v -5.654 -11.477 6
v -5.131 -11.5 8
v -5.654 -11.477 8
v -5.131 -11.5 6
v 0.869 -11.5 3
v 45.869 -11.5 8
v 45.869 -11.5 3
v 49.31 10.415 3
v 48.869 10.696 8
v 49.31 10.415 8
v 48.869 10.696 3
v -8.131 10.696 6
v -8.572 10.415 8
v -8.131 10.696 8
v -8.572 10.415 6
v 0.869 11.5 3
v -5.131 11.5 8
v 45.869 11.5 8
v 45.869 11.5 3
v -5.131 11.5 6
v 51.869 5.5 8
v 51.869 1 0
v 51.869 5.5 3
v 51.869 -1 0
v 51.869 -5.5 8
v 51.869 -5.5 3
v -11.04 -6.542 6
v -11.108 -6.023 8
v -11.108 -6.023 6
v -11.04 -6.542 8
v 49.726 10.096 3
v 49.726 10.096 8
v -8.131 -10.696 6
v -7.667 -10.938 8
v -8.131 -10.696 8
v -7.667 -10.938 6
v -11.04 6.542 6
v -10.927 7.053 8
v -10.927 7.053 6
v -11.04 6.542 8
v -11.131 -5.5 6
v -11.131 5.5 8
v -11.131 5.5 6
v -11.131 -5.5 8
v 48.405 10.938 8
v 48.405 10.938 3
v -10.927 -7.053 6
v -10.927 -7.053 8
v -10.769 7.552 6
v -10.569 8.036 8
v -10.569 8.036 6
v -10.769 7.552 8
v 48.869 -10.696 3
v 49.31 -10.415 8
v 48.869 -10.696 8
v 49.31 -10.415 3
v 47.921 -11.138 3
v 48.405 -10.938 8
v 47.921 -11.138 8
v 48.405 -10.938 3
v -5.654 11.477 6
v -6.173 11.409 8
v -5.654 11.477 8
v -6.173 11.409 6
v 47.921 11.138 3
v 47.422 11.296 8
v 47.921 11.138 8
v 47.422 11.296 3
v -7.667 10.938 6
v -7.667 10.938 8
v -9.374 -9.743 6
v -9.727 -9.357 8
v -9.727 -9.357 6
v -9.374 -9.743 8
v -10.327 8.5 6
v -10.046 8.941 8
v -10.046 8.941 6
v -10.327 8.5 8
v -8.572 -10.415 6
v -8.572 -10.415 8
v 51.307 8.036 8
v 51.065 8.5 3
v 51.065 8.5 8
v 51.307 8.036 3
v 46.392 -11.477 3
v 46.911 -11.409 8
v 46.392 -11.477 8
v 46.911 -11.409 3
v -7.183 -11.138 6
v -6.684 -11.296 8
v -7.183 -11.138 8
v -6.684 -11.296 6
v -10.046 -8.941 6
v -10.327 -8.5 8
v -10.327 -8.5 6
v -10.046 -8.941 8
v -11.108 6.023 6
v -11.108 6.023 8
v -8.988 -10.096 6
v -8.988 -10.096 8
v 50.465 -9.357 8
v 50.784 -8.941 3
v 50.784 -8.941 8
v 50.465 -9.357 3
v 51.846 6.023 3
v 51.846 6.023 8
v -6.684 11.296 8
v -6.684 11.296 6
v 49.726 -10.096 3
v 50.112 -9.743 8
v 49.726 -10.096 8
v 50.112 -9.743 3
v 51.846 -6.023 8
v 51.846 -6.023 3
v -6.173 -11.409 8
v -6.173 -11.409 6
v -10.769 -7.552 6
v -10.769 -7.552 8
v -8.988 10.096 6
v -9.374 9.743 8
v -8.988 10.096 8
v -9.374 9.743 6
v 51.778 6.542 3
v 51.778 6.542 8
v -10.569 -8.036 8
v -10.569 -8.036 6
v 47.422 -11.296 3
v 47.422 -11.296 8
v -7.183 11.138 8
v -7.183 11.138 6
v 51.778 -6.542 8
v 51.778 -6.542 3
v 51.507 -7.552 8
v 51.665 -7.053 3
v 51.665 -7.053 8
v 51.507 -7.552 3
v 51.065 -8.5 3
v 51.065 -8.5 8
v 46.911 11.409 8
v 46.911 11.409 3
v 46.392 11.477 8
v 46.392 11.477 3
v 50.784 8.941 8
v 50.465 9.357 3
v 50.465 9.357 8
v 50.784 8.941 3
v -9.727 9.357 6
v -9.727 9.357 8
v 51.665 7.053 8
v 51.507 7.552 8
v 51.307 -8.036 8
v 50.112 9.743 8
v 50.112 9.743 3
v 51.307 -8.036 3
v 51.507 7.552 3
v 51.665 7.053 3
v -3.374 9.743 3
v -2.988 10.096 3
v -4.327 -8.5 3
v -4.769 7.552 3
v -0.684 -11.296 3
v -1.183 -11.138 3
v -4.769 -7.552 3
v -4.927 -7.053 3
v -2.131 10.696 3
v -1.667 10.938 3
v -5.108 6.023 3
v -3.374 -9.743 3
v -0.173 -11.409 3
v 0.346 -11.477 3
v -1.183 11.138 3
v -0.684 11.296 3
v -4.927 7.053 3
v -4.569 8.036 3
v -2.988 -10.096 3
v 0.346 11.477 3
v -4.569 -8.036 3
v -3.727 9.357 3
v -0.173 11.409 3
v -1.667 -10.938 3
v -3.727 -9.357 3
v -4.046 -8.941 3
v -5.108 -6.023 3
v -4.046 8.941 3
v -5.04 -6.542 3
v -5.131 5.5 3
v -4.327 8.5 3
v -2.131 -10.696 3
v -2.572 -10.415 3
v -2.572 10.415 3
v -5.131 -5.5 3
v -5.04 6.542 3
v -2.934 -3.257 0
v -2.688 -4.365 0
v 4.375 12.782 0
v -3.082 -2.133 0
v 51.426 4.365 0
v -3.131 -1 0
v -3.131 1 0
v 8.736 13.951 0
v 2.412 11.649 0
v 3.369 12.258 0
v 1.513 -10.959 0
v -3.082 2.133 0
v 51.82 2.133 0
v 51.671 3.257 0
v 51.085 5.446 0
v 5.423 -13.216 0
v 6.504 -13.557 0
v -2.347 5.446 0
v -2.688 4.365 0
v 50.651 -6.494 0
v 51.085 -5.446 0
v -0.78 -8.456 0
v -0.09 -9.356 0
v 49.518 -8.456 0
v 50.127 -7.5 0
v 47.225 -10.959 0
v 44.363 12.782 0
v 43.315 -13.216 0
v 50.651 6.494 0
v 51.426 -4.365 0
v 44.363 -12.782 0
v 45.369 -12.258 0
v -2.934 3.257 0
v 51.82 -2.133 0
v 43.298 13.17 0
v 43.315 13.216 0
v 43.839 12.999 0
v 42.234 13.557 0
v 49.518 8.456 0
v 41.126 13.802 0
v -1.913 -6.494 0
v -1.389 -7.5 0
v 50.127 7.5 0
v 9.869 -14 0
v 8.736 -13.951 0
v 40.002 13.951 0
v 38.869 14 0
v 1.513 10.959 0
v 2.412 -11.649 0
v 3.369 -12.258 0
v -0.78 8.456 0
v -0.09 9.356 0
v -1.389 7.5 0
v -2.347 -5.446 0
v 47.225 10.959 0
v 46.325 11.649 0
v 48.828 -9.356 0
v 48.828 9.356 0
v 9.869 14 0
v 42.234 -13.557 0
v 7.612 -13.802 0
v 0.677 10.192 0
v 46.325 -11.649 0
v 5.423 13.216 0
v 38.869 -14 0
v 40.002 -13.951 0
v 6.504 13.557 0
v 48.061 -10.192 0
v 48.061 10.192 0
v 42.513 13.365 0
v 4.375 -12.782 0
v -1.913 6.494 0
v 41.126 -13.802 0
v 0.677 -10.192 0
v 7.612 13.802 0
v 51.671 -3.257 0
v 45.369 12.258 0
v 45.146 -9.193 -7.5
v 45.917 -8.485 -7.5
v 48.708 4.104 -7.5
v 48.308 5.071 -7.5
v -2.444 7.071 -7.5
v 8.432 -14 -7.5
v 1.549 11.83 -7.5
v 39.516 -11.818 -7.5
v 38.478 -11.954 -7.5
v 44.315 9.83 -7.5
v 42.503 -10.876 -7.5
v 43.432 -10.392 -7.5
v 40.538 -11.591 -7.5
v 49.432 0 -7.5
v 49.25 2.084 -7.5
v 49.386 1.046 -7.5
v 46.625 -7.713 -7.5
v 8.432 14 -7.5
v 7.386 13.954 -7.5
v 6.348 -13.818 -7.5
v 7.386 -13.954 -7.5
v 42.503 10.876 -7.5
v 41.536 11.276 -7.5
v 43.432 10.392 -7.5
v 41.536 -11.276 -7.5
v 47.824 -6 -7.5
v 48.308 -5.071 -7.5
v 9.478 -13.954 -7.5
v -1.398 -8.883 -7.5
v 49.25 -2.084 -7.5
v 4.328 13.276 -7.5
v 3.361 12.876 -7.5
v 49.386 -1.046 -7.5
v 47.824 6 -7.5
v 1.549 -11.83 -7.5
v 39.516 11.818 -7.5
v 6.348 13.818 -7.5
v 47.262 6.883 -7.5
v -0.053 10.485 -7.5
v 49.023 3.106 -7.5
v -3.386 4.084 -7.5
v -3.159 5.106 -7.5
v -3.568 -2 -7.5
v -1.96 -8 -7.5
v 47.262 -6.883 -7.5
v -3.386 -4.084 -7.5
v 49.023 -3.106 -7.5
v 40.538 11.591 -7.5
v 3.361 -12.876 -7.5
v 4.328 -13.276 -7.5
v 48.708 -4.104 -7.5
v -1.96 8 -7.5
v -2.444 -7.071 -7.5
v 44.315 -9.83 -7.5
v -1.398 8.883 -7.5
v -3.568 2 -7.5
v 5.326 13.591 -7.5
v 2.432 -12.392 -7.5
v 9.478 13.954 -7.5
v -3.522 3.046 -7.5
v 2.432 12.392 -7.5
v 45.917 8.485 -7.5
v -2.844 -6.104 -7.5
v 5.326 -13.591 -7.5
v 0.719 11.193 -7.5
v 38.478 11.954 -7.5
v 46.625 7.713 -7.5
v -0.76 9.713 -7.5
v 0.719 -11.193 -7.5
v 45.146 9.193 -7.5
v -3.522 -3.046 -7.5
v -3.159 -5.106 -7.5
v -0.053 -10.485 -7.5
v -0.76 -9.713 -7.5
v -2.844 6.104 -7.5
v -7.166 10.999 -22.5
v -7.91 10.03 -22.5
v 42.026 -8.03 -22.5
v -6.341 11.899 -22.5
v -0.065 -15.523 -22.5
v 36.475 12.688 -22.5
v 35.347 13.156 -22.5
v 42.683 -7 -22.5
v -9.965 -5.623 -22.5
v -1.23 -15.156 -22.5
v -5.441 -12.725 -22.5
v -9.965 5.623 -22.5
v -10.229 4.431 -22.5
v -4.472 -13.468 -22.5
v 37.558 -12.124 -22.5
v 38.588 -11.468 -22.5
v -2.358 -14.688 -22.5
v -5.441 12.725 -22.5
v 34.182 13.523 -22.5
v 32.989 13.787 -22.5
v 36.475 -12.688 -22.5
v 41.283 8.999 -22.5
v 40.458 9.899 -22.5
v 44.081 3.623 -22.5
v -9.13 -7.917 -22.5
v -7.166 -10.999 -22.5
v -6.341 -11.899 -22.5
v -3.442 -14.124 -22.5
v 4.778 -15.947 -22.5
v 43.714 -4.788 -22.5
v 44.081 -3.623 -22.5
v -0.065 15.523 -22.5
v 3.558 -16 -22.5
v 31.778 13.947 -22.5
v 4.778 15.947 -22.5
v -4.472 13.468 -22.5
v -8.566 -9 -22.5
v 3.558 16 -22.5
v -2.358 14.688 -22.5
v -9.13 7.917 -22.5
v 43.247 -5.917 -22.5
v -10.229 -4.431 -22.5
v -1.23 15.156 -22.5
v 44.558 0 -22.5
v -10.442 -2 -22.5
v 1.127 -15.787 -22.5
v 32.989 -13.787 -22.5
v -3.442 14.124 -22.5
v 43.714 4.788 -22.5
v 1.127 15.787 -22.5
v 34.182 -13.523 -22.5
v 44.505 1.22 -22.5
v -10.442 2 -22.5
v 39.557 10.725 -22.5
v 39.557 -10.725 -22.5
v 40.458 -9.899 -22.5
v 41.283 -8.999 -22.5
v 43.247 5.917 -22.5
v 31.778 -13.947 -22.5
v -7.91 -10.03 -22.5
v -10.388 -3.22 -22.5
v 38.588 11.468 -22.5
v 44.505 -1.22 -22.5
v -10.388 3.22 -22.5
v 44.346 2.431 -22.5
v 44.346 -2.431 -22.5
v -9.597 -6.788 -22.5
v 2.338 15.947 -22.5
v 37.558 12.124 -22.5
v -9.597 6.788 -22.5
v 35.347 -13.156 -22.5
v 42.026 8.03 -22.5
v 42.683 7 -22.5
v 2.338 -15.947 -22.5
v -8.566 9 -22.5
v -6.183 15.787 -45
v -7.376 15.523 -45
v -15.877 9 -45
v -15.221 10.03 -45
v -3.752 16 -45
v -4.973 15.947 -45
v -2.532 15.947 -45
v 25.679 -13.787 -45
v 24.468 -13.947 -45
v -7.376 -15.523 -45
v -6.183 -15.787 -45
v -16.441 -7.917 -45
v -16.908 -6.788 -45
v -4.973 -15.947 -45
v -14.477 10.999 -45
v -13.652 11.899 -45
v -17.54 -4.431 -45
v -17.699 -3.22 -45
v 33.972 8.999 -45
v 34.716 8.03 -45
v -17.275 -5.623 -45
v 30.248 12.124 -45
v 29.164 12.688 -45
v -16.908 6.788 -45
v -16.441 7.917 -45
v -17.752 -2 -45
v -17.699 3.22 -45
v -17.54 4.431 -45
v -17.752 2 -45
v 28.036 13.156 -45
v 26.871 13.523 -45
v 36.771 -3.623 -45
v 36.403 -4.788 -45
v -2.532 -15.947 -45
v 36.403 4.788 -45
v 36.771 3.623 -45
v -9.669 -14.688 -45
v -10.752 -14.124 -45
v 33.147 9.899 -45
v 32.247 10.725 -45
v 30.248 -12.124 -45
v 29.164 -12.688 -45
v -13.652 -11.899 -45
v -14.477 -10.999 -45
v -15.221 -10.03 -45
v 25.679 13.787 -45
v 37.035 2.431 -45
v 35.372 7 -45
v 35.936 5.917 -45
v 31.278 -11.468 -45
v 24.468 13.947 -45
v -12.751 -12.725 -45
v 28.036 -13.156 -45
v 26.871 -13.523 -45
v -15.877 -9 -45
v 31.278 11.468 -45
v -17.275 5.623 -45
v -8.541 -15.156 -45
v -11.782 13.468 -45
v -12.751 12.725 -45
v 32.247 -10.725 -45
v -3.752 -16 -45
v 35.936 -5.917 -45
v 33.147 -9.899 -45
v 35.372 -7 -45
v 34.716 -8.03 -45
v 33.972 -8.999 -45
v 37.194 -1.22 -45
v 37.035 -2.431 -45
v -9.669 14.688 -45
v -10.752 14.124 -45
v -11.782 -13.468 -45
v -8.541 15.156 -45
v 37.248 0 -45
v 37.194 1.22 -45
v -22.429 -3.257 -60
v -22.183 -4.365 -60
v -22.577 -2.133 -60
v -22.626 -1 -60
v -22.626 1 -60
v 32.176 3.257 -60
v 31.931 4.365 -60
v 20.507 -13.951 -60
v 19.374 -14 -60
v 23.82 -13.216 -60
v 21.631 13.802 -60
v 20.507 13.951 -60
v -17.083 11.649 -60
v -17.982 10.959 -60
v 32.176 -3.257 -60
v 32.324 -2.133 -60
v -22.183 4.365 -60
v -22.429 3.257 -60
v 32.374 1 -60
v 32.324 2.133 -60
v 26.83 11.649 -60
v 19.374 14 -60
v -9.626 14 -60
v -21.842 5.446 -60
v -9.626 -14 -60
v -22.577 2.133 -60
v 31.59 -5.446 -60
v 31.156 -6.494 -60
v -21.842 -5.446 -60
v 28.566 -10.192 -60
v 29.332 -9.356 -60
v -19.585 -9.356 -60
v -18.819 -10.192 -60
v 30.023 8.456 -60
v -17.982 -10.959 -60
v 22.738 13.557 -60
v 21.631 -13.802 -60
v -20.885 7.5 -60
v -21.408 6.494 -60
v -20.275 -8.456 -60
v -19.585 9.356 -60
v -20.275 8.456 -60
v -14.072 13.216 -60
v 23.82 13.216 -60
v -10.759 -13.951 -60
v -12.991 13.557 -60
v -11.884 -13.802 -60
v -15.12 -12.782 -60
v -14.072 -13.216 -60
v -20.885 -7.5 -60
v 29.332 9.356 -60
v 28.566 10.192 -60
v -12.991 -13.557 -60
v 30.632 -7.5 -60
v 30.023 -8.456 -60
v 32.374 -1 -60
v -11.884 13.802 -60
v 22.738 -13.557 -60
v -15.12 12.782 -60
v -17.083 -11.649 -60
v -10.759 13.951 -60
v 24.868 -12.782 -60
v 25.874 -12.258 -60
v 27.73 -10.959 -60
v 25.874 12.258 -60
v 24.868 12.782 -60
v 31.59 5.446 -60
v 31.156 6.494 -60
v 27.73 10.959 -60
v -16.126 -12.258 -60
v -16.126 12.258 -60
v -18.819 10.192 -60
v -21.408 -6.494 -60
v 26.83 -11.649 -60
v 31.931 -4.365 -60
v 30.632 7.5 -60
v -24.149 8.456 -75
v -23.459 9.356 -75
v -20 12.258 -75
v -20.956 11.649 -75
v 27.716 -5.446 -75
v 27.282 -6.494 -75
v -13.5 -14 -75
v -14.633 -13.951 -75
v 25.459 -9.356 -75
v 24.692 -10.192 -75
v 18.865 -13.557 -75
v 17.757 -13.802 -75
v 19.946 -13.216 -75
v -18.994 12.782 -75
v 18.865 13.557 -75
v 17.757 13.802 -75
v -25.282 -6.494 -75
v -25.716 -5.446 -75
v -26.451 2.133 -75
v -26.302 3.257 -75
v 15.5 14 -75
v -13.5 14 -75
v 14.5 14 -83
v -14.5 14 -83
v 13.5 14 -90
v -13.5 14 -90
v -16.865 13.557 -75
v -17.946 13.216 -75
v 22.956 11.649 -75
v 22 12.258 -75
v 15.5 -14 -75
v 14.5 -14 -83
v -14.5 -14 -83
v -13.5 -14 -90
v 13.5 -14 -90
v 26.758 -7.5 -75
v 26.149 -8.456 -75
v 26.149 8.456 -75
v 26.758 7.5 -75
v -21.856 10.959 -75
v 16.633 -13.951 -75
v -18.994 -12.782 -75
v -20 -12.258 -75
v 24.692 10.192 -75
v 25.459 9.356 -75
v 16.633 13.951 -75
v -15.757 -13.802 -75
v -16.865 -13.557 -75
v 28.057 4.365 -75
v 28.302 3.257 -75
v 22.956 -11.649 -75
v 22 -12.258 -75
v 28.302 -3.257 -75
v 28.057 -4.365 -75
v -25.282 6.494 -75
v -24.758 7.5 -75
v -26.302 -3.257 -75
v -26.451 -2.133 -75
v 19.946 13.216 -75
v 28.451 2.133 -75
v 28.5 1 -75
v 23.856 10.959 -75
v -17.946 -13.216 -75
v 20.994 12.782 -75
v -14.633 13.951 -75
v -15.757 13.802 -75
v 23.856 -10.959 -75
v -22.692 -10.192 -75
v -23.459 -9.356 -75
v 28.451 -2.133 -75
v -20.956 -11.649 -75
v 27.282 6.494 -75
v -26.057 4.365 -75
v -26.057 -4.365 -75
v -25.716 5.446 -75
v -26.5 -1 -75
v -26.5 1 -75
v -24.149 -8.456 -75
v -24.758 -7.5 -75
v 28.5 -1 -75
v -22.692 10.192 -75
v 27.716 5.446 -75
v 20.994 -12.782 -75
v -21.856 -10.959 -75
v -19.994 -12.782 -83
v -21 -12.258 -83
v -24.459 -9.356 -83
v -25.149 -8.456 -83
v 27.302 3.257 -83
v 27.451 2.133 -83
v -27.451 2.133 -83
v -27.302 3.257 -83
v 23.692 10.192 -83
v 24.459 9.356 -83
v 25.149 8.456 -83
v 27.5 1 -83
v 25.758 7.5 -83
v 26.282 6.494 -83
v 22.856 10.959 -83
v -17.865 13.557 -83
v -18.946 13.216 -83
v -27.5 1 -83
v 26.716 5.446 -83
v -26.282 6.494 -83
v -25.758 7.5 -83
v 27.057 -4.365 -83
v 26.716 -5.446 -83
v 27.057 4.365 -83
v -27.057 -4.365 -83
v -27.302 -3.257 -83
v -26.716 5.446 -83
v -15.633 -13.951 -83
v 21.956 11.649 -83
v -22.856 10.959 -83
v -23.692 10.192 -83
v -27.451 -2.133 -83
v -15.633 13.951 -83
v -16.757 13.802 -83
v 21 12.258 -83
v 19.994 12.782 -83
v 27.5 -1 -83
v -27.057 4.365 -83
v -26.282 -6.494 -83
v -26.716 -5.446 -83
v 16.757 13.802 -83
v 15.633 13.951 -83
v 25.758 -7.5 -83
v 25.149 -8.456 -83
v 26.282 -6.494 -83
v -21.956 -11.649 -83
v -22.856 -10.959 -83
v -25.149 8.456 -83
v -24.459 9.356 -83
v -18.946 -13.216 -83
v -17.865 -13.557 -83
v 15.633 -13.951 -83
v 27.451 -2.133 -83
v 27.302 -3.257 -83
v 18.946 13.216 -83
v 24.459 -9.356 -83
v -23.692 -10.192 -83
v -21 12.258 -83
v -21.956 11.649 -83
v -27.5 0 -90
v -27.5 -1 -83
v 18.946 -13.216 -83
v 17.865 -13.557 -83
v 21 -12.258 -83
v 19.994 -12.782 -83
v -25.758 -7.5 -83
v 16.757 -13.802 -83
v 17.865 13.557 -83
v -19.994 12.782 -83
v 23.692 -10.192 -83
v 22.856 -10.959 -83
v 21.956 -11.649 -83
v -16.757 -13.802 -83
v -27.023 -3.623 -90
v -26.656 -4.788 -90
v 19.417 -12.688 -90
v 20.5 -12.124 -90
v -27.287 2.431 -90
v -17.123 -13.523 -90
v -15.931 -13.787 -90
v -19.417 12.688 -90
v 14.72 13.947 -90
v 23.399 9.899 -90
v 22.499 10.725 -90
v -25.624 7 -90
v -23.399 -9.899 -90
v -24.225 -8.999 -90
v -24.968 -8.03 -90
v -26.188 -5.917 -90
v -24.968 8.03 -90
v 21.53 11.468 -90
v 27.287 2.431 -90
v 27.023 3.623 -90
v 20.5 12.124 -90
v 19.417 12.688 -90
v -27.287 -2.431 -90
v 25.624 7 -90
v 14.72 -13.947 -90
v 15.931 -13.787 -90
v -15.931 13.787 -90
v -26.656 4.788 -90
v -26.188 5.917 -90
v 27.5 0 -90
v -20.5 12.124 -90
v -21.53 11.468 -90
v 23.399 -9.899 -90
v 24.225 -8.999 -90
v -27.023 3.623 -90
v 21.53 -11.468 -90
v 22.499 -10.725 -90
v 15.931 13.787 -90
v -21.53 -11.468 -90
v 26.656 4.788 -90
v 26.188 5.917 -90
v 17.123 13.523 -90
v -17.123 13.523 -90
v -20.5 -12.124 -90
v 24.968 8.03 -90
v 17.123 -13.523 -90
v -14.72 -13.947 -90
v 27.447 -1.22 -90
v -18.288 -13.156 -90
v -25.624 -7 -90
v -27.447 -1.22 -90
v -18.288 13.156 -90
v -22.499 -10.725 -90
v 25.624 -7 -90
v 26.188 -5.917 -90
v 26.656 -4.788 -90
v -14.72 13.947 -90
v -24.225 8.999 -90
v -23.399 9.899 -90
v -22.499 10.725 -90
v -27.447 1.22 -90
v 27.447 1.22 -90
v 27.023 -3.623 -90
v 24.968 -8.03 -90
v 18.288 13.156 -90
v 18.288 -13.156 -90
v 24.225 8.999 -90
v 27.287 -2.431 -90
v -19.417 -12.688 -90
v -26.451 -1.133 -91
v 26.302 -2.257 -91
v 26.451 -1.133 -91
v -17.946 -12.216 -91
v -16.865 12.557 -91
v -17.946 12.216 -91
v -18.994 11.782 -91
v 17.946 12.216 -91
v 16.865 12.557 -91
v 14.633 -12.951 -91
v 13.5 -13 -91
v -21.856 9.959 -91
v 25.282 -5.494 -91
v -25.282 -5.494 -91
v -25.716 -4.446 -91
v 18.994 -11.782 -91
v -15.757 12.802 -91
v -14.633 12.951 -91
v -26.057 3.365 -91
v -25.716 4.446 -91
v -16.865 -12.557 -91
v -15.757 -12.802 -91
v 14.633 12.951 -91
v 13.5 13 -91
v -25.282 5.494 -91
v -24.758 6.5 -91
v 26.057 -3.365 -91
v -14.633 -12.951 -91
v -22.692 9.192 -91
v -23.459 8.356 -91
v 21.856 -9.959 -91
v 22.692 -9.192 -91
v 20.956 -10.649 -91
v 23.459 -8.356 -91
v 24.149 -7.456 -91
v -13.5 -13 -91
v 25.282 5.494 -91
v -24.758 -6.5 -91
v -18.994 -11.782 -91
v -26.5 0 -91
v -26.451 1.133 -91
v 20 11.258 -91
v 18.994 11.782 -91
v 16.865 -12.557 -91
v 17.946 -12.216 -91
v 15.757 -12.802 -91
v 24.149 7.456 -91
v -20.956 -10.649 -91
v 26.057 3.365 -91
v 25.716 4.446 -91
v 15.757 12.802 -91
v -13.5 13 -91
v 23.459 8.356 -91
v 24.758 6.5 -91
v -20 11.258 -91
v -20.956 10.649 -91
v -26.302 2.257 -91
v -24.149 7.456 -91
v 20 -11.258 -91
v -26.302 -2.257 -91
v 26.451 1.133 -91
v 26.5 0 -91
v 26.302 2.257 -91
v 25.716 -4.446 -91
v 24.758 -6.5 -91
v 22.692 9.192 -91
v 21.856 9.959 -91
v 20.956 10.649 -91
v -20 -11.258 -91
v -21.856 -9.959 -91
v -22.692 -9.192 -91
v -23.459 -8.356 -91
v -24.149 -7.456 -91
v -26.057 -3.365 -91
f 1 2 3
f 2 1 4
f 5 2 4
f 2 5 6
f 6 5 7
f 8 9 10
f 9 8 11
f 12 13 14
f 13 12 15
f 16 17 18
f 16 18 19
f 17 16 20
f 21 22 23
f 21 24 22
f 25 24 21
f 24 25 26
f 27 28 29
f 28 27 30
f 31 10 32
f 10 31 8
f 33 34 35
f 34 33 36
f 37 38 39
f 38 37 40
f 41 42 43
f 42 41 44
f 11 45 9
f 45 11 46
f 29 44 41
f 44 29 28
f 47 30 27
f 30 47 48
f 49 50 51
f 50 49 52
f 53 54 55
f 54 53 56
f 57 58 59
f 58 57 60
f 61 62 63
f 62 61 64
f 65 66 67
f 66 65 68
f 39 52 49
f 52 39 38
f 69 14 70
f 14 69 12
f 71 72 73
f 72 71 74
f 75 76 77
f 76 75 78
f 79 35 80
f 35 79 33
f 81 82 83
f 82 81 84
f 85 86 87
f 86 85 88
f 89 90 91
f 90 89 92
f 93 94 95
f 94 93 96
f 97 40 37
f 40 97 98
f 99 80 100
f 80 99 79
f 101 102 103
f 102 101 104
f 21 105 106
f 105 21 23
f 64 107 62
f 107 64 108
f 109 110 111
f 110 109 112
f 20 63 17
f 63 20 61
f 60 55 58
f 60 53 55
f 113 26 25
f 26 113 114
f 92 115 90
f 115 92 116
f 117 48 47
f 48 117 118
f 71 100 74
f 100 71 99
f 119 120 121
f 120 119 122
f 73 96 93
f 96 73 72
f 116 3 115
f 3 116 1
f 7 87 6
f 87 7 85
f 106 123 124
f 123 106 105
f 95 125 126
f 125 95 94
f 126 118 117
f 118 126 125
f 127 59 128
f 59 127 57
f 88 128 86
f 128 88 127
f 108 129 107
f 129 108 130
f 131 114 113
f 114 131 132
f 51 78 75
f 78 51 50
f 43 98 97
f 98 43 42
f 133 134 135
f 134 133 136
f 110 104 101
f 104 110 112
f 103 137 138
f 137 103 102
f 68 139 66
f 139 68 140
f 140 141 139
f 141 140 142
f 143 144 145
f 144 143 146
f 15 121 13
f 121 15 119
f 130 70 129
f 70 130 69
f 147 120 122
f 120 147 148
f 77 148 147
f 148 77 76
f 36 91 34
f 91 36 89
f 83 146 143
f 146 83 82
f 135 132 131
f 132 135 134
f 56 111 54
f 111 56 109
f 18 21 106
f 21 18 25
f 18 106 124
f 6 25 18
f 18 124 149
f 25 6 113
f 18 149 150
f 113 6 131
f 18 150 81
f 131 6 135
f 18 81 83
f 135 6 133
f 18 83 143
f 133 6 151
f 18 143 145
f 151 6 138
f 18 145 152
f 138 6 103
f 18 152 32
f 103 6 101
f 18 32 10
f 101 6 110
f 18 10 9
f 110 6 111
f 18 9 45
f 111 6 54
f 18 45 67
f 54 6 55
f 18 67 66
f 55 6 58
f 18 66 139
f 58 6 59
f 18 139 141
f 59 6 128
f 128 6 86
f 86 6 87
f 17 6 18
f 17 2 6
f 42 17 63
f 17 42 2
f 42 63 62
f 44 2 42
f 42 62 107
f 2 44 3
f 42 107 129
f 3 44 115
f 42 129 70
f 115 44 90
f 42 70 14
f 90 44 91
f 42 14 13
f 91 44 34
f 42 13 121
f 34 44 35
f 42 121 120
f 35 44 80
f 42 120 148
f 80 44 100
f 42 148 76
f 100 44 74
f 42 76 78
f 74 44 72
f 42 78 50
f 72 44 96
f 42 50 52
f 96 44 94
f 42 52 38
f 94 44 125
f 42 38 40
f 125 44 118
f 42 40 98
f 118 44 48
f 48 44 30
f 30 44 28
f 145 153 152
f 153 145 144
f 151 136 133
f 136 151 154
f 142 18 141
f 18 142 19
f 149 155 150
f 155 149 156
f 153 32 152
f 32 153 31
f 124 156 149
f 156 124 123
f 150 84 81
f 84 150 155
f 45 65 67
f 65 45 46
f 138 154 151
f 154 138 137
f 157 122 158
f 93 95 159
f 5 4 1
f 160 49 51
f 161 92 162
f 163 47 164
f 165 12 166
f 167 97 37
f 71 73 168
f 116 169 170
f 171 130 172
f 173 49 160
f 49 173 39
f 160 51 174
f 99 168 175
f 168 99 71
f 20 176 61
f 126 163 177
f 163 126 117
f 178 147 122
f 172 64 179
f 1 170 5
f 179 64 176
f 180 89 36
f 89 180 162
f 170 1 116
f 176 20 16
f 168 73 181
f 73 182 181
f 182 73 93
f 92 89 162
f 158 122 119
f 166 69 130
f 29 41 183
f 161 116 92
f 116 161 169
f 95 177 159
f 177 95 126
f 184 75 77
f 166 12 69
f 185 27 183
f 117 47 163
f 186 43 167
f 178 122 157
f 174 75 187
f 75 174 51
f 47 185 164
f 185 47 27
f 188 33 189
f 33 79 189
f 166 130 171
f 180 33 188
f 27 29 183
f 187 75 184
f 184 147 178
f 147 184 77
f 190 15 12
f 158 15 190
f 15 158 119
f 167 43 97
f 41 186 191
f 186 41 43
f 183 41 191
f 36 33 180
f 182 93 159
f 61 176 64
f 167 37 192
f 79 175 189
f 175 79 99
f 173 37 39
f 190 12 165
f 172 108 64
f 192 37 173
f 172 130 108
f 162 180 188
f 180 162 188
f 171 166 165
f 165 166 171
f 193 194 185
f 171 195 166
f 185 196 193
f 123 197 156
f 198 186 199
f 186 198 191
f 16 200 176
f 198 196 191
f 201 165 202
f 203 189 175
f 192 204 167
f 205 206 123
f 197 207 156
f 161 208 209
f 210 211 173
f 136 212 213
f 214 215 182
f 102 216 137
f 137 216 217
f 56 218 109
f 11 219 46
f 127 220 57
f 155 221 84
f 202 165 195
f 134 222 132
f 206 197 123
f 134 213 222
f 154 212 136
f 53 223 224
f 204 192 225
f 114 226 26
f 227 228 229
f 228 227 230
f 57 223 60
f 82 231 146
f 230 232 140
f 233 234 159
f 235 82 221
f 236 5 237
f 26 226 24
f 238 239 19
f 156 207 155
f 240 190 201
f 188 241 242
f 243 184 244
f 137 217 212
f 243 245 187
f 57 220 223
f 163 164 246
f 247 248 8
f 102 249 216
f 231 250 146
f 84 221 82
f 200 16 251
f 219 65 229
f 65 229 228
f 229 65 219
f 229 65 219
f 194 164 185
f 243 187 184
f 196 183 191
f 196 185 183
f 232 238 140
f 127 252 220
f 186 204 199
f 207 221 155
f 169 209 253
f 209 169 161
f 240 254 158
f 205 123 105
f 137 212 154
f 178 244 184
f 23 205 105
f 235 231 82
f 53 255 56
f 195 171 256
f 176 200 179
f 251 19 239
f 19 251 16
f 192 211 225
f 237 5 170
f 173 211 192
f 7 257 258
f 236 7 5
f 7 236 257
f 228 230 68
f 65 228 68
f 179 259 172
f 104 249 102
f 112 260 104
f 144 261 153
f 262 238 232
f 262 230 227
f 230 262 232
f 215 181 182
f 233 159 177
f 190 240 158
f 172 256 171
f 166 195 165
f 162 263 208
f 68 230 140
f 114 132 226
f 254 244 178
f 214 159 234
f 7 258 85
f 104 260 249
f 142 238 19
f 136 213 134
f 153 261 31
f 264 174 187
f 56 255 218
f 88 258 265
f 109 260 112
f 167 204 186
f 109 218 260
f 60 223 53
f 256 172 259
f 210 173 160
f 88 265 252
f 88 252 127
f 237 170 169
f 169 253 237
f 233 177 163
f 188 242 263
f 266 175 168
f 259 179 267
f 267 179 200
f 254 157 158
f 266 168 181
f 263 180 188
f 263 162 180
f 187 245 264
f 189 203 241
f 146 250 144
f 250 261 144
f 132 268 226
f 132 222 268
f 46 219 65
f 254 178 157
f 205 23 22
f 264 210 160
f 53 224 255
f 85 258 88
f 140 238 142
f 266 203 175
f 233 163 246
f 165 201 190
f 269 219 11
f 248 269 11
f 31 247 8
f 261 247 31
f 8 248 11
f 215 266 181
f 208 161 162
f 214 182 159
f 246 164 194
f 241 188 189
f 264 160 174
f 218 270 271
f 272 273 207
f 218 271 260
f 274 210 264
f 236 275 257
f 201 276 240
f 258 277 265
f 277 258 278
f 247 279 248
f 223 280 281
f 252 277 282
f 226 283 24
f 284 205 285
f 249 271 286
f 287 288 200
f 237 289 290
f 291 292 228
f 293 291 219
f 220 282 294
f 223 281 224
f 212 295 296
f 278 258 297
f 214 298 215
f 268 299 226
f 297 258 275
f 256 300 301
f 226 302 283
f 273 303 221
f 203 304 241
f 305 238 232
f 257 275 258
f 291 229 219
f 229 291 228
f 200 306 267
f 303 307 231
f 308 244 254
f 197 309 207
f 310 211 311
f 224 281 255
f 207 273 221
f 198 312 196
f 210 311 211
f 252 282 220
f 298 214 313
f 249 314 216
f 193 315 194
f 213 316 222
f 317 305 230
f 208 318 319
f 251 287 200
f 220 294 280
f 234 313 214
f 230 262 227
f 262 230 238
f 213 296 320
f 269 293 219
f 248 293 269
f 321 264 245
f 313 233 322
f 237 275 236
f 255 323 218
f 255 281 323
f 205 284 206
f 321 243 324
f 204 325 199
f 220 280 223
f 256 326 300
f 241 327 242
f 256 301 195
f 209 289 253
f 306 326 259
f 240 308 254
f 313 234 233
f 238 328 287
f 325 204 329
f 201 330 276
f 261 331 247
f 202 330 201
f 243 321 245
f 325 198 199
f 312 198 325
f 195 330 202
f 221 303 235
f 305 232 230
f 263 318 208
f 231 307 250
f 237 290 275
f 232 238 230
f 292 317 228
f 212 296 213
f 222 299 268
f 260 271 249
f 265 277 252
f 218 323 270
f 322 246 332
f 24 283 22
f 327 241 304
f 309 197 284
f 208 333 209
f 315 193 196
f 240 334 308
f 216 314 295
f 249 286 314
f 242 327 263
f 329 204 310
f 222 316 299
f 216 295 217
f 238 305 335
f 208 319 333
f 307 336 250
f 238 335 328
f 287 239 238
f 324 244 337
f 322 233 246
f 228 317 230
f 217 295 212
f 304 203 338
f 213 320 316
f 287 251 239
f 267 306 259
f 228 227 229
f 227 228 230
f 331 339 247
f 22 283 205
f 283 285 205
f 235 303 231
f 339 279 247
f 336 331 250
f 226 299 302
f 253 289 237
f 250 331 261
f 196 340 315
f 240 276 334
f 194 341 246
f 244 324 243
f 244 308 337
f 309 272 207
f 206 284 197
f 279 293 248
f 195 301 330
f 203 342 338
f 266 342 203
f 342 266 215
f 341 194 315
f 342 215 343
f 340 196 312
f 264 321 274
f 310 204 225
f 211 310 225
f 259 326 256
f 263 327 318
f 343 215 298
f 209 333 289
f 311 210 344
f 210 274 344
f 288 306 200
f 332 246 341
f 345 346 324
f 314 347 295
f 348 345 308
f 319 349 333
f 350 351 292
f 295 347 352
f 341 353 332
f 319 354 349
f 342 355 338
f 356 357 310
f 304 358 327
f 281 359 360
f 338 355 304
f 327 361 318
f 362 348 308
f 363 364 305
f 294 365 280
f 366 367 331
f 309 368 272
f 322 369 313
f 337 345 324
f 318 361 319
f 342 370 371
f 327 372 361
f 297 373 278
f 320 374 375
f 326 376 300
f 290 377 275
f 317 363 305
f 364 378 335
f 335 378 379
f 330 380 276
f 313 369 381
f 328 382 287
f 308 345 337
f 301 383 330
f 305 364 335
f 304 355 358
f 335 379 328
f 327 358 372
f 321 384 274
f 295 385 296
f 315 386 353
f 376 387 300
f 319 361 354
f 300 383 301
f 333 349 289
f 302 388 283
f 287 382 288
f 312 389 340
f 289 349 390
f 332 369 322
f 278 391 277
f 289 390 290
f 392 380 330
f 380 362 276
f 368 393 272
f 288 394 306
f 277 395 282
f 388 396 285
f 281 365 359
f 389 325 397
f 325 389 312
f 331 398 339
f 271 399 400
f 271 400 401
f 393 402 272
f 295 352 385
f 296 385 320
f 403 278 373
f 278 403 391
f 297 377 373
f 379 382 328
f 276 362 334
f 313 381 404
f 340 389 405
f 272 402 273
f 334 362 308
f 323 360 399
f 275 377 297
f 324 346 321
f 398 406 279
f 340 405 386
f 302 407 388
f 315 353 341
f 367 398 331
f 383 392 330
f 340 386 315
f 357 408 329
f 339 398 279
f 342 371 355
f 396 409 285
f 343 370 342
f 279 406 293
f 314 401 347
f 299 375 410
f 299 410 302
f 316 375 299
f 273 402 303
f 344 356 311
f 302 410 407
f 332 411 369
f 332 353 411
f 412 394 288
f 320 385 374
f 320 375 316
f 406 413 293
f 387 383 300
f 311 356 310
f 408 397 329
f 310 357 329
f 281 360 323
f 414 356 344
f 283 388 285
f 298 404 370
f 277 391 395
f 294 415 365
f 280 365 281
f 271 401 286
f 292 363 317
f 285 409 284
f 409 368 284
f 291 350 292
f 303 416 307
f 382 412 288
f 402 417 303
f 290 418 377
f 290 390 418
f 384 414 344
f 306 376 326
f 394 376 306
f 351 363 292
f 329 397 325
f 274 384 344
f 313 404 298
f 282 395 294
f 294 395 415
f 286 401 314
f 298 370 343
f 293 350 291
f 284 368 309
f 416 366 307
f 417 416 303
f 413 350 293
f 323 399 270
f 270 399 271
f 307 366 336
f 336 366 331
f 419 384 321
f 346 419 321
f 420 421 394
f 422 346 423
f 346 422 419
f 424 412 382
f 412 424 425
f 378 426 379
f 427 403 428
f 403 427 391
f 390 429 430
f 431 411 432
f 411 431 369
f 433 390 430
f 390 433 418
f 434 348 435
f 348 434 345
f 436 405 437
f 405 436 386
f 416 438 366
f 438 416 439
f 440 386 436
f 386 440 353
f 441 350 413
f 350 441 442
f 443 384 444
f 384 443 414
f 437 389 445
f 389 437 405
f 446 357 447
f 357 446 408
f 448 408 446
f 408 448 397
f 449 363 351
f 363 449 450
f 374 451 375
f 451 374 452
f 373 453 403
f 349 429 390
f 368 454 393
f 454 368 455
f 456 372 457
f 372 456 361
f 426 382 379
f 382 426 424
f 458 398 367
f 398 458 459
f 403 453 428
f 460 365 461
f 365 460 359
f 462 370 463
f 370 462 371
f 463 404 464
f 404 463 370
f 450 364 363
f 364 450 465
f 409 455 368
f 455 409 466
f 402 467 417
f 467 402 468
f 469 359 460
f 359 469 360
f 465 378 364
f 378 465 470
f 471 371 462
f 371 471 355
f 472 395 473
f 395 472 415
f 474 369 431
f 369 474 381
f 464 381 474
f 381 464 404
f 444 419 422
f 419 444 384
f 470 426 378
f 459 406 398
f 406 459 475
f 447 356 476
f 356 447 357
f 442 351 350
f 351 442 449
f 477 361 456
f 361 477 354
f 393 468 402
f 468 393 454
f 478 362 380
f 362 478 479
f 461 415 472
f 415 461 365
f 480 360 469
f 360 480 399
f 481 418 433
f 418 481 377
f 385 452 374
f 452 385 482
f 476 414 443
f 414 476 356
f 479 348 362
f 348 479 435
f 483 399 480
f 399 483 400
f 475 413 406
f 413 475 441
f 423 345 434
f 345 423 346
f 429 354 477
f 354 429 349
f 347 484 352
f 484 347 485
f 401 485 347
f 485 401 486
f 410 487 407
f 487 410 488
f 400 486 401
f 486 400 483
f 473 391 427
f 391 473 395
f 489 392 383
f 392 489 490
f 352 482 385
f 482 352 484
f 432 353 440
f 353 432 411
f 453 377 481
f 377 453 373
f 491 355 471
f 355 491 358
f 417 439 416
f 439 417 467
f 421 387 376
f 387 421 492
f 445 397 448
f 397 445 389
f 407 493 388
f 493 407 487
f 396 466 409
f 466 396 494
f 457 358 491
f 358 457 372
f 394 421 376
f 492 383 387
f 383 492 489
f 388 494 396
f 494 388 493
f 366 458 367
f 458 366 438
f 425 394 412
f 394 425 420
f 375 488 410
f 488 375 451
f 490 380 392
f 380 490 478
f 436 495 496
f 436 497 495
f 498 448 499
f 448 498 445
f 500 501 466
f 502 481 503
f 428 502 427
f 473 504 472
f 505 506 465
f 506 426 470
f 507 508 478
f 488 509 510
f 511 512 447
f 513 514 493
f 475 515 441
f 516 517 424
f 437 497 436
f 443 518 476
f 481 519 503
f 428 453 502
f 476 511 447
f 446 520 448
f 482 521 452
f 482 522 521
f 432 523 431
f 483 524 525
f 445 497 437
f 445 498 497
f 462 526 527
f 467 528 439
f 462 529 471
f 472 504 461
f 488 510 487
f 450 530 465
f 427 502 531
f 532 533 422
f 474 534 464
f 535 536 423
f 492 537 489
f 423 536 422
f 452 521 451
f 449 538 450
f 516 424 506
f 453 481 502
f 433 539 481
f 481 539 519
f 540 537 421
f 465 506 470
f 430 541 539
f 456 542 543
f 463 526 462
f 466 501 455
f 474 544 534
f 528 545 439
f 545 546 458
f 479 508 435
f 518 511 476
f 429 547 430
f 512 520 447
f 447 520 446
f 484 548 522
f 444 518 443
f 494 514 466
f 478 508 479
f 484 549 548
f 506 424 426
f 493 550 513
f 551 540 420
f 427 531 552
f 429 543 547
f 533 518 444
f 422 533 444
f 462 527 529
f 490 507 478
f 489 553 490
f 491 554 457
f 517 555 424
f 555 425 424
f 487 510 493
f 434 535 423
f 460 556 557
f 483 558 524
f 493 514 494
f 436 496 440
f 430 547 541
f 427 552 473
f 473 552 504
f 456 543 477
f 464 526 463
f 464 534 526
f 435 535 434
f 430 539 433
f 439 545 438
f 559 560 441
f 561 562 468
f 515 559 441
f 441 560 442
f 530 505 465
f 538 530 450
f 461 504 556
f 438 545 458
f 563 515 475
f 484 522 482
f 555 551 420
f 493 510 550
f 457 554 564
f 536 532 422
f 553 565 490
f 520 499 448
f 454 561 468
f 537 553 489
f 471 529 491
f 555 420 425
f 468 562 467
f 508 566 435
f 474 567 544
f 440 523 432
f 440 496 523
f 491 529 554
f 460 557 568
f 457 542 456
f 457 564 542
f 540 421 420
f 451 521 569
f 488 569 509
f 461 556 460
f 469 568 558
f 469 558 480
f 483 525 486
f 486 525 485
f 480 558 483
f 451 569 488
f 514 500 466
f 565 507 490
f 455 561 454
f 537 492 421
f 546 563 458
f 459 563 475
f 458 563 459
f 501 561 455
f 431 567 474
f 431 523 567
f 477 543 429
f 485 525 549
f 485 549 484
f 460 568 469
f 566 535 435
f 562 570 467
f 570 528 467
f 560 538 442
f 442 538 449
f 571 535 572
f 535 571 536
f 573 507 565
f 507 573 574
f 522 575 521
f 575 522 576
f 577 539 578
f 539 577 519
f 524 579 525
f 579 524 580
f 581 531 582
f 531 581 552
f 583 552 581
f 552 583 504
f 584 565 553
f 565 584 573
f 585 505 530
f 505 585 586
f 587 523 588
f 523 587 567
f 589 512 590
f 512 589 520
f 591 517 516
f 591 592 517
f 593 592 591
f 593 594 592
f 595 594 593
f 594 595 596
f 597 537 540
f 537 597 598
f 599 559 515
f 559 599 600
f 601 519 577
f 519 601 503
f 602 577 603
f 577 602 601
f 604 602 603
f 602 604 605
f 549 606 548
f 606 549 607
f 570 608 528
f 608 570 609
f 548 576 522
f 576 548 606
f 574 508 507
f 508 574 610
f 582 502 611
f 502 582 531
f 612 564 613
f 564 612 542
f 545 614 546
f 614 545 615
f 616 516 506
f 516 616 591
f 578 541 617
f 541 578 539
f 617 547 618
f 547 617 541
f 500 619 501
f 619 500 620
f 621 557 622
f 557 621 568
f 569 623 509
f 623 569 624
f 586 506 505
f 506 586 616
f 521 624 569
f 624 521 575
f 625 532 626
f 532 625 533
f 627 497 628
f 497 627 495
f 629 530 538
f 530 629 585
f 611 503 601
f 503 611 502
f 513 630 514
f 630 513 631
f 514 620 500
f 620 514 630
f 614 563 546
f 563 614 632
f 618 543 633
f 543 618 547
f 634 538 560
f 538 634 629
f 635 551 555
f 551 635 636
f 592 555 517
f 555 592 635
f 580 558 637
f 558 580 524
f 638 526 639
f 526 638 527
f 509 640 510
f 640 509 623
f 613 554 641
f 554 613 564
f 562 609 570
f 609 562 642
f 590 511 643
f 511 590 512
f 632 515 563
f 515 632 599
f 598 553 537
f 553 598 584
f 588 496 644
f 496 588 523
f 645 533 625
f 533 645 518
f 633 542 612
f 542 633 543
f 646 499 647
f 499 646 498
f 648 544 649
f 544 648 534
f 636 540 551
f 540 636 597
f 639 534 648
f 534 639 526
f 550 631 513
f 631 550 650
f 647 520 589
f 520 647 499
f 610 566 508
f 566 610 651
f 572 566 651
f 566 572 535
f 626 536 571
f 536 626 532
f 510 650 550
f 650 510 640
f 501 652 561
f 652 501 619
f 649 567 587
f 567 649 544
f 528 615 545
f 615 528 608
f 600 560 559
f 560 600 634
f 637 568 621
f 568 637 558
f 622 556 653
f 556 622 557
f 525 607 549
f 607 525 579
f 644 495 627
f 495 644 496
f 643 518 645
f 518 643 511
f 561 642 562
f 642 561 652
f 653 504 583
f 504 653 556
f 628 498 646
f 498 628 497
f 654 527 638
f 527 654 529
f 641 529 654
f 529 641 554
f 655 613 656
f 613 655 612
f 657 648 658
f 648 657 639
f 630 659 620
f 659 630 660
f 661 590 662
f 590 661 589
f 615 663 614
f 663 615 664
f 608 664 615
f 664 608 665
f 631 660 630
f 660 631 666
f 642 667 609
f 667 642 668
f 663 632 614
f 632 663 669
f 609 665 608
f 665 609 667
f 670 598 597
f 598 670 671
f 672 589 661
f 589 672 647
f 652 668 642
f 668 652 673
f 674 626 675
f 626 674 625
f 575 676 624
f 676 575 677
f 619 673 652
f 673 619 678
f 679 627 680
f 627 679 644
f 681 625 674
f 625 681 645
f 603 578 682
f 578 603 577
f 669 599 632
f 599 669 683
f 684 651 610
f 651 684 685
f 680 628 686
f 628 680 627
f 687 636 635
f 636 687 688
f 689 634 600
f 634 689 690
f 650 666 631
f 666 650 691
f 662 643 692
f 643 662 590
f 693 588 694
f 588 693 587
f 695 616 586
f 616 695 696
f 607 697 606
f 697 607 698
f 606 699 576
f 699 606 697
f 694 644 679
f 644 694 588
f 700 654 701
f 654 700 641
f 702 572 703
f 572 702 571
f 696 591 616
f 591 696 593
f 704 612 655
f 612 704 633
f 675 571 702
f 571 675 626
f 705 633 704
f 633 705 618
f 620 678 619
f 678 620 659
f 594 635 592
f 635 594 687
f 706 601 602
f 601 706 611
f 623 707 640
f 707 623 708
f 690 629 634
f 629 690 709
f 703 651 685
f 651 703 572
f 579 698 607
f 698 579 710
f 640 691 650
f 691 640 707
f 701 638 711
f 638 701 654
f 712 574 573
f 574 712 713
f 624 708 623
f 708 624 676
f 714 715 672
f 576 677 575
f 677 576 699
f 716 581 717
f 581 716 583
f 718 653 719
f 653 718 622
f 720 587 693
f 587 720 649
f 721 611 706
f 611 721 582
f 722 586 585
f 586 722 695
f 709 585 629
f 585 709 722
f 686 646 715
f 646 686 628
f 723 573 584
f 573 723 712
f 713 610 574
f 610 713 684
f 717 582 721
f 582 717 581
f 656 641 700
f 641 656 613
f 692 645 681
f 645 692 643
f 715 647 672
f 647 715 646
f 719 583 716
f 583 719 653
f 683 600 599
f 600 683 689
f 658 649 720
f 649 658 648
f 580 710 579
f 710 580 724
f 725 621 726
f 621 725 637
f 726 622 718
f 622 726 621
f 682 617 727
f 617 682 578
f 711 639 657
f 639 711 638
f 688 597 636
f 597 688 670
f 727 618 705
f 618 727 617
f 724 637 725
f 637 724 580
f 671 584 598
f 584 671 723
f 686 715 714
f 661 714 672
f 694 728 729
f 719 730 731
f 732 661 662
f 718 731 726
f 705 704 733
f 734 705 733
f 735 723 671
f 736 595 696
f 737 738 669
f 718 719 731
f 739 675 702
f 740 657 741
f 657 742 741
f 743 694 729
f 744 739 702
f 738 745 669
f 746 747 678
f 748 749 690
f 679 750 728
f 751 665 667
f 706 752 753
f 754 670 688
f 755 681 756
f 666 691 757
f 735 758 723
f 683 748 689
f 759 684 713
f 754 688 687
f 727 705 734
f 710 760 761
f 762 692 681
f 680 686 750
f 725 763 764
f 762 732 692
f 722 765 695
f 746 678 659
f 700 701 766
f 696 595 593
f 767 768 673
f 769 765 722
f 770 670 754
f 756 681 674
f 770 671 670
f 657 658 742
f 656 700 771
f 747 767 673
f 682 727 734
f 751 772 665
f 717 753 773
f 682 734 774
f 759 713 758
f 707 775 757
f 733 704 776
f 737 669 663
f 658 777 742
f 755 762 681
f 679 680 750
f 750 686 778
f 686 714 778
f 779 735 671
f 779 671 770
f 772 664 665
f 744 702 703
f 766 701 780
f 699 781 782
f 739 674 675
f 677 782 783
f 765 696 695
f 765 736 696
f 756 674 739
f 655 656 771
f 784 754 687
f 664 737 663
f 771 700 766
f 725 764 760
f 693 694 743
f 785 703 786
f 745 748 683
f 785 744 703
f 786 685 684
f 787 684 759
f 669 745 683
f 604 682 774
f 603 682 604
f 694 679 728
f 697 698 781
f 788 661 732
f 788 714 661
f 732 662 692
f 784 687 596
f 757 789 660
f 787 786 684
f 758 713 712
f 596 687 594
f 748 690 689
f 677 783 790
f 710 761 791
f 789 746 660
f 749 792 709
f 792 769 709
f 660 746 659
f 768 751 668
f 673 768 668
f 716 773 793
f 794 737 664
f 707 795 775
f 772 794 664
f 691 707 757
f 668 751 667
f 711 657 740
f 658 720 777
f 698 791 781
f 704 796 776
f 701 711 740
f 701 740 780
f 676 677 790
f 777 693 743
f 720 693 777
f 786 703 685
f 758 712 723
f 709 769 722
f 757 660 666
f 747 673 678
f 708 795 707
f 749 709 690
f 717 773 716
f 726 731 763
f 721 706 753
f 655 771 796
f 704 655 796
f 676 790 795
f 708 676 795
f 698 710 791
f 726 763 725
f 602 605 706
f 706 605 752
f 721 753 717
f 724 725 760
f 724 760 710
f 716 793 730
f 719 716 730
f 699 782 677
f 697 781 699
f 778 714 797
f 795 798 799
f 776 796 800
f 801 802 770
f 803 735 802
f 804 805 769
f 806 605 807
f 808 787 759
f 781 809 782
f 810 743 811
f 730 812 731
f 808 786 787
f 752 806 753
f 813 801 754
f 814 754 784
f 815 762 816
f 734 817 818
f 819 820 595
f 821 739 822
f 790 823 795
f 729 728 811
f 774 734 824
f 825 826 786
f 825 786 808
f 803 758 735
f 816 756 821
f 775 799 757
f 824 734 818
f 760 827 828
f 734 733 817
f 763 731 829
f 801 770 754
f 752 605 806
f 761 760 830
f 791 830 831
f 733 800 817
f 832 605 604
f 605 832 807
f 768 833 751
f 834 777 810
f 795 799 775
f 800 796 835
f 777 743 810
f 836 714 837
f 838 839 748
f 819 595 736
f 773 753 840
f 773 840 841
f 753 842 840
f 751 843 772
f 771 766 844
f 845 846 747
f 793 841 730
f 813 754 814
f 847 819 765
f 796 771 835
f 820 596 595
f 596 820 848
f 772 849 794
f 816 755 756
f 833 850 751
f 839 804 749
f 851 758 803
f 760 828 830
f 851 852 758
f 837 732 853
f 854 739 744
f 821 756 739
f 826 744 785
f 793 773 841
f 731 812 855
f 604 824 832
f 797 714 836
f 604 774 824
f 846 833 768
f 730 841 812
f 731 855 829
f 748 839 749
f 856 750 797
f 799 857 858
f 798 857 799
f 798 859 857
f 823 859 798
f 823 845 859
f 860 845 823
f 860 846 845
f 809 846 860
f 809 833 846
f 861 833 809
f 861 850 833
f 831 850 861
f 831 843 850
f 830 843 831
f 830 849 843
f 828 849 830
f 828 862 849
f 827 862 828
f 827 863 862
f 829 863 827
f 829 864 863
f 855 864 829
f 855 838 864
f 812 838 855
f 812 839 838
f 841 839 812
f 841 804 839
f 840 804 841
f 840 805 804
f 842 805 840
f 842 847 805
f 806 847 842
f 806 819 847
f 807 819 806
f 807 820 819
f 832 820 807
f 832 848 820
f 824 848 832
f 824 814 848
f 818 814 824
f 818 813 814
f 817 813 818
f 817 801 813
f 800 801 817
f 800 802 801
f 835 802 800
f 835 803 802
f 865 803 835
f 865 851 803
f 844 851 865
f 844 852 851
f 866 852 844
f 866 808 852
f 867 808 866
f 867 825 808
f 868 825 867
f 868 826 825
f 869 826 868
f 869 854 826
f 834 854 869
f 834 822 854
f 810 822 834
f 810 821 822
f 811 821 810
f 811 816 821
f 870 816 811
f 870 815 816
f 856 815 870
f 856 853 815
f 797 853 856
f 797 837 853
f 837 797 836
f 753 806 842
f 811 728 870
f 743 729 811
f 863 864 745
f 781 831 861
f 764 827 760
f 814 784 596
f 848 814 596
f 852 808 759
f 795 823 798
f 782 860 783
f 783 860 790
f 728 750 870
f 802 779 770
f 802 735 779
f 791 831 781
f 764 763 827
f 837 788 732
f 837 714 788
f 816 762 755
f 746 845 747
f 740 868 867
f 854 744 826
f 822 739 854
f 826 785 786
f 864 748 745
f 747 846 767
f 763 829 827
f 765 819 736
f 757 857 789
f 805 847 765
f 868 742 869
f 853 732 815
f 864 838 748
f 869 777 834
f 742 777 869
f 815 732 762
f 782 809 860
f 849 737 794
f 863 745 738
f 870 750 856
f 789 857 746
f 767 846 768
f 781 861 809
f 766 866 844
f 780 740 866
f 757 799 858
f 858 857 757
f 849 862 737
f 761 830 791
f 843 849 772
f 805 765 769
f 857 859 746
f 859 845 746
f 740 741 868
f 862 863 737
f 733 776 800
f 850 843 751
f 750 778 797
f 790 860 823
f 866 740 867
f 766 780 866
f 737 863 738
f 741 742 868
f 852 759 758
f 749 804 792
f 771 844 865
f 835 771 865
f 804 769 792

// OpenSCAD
$fa = 5;
$fs = 0.5;
eps = 0.000001;

module reify(translation) {
  translate(translation)
    linear_extrude(eps)
      children();
}

module chain(z_steps) {
  if ($children > 0) {
    for (i = [0 : $children-2]) {
      hull() {
         children(i);
         children(i+1);
      }
    }
  }
}

module round_rect(x, y1, y2, radius) {
  assert(x >= radius*2);
  assert(y1 >= radius*2);
  assert(y2 >= radius*2);
  
  hull()
    for (a = [-1, 1], b = [-1, 1])
      translate([
        (x*0.5-radius)*a,
        ((a == 1 ? y1 : y2)*0.5-radius)*b,
        0
      ])
        circle(radius);
}

// The forward receiver should sit right on the x-y plane when added.
module grip() {
  height = 75;
  angle = 18;
  disp = height*tan(angle);
  chain() {
    reify([disp-4, 0, 8])               round_rect(63, 23, 23, 6);
    reify([disp-4, 0, 6])               round_rect(63, 23, 23, 6);
    reify([disp-1, 0, 3])               round_rect(57, 23, 23, 6);
    reify([disp, 0, 0])                 round_rect(55, 28, 28, 13);
    reify([0.9*disp+1, 0, -0.1*height]) round_rect(53, 24, 28, 12);
    reify([0.7*disp, 0, -0.3*height])   round_rect(55, 28, 32, 14);
    reify([0.4*disp, 0, -0.6*height])   round_rect(55, 28, 32, 14);
    reify([0.2*disp, 0, -0.8*height])   round_rect(55, 28, 28, 13);
    reify([1, 0, -height])              round_rect(55, 28, 28, 13);
    reify([0, 0, -height-8])            round_rect(55, 28, 28, 13);
    reify([0, 0, -height-15])           round_rect(55, 28, 28, 14);
    reify([0, 0, -height-16])           round_rect(53, 26, 26, 13);
  }
}

grip();
